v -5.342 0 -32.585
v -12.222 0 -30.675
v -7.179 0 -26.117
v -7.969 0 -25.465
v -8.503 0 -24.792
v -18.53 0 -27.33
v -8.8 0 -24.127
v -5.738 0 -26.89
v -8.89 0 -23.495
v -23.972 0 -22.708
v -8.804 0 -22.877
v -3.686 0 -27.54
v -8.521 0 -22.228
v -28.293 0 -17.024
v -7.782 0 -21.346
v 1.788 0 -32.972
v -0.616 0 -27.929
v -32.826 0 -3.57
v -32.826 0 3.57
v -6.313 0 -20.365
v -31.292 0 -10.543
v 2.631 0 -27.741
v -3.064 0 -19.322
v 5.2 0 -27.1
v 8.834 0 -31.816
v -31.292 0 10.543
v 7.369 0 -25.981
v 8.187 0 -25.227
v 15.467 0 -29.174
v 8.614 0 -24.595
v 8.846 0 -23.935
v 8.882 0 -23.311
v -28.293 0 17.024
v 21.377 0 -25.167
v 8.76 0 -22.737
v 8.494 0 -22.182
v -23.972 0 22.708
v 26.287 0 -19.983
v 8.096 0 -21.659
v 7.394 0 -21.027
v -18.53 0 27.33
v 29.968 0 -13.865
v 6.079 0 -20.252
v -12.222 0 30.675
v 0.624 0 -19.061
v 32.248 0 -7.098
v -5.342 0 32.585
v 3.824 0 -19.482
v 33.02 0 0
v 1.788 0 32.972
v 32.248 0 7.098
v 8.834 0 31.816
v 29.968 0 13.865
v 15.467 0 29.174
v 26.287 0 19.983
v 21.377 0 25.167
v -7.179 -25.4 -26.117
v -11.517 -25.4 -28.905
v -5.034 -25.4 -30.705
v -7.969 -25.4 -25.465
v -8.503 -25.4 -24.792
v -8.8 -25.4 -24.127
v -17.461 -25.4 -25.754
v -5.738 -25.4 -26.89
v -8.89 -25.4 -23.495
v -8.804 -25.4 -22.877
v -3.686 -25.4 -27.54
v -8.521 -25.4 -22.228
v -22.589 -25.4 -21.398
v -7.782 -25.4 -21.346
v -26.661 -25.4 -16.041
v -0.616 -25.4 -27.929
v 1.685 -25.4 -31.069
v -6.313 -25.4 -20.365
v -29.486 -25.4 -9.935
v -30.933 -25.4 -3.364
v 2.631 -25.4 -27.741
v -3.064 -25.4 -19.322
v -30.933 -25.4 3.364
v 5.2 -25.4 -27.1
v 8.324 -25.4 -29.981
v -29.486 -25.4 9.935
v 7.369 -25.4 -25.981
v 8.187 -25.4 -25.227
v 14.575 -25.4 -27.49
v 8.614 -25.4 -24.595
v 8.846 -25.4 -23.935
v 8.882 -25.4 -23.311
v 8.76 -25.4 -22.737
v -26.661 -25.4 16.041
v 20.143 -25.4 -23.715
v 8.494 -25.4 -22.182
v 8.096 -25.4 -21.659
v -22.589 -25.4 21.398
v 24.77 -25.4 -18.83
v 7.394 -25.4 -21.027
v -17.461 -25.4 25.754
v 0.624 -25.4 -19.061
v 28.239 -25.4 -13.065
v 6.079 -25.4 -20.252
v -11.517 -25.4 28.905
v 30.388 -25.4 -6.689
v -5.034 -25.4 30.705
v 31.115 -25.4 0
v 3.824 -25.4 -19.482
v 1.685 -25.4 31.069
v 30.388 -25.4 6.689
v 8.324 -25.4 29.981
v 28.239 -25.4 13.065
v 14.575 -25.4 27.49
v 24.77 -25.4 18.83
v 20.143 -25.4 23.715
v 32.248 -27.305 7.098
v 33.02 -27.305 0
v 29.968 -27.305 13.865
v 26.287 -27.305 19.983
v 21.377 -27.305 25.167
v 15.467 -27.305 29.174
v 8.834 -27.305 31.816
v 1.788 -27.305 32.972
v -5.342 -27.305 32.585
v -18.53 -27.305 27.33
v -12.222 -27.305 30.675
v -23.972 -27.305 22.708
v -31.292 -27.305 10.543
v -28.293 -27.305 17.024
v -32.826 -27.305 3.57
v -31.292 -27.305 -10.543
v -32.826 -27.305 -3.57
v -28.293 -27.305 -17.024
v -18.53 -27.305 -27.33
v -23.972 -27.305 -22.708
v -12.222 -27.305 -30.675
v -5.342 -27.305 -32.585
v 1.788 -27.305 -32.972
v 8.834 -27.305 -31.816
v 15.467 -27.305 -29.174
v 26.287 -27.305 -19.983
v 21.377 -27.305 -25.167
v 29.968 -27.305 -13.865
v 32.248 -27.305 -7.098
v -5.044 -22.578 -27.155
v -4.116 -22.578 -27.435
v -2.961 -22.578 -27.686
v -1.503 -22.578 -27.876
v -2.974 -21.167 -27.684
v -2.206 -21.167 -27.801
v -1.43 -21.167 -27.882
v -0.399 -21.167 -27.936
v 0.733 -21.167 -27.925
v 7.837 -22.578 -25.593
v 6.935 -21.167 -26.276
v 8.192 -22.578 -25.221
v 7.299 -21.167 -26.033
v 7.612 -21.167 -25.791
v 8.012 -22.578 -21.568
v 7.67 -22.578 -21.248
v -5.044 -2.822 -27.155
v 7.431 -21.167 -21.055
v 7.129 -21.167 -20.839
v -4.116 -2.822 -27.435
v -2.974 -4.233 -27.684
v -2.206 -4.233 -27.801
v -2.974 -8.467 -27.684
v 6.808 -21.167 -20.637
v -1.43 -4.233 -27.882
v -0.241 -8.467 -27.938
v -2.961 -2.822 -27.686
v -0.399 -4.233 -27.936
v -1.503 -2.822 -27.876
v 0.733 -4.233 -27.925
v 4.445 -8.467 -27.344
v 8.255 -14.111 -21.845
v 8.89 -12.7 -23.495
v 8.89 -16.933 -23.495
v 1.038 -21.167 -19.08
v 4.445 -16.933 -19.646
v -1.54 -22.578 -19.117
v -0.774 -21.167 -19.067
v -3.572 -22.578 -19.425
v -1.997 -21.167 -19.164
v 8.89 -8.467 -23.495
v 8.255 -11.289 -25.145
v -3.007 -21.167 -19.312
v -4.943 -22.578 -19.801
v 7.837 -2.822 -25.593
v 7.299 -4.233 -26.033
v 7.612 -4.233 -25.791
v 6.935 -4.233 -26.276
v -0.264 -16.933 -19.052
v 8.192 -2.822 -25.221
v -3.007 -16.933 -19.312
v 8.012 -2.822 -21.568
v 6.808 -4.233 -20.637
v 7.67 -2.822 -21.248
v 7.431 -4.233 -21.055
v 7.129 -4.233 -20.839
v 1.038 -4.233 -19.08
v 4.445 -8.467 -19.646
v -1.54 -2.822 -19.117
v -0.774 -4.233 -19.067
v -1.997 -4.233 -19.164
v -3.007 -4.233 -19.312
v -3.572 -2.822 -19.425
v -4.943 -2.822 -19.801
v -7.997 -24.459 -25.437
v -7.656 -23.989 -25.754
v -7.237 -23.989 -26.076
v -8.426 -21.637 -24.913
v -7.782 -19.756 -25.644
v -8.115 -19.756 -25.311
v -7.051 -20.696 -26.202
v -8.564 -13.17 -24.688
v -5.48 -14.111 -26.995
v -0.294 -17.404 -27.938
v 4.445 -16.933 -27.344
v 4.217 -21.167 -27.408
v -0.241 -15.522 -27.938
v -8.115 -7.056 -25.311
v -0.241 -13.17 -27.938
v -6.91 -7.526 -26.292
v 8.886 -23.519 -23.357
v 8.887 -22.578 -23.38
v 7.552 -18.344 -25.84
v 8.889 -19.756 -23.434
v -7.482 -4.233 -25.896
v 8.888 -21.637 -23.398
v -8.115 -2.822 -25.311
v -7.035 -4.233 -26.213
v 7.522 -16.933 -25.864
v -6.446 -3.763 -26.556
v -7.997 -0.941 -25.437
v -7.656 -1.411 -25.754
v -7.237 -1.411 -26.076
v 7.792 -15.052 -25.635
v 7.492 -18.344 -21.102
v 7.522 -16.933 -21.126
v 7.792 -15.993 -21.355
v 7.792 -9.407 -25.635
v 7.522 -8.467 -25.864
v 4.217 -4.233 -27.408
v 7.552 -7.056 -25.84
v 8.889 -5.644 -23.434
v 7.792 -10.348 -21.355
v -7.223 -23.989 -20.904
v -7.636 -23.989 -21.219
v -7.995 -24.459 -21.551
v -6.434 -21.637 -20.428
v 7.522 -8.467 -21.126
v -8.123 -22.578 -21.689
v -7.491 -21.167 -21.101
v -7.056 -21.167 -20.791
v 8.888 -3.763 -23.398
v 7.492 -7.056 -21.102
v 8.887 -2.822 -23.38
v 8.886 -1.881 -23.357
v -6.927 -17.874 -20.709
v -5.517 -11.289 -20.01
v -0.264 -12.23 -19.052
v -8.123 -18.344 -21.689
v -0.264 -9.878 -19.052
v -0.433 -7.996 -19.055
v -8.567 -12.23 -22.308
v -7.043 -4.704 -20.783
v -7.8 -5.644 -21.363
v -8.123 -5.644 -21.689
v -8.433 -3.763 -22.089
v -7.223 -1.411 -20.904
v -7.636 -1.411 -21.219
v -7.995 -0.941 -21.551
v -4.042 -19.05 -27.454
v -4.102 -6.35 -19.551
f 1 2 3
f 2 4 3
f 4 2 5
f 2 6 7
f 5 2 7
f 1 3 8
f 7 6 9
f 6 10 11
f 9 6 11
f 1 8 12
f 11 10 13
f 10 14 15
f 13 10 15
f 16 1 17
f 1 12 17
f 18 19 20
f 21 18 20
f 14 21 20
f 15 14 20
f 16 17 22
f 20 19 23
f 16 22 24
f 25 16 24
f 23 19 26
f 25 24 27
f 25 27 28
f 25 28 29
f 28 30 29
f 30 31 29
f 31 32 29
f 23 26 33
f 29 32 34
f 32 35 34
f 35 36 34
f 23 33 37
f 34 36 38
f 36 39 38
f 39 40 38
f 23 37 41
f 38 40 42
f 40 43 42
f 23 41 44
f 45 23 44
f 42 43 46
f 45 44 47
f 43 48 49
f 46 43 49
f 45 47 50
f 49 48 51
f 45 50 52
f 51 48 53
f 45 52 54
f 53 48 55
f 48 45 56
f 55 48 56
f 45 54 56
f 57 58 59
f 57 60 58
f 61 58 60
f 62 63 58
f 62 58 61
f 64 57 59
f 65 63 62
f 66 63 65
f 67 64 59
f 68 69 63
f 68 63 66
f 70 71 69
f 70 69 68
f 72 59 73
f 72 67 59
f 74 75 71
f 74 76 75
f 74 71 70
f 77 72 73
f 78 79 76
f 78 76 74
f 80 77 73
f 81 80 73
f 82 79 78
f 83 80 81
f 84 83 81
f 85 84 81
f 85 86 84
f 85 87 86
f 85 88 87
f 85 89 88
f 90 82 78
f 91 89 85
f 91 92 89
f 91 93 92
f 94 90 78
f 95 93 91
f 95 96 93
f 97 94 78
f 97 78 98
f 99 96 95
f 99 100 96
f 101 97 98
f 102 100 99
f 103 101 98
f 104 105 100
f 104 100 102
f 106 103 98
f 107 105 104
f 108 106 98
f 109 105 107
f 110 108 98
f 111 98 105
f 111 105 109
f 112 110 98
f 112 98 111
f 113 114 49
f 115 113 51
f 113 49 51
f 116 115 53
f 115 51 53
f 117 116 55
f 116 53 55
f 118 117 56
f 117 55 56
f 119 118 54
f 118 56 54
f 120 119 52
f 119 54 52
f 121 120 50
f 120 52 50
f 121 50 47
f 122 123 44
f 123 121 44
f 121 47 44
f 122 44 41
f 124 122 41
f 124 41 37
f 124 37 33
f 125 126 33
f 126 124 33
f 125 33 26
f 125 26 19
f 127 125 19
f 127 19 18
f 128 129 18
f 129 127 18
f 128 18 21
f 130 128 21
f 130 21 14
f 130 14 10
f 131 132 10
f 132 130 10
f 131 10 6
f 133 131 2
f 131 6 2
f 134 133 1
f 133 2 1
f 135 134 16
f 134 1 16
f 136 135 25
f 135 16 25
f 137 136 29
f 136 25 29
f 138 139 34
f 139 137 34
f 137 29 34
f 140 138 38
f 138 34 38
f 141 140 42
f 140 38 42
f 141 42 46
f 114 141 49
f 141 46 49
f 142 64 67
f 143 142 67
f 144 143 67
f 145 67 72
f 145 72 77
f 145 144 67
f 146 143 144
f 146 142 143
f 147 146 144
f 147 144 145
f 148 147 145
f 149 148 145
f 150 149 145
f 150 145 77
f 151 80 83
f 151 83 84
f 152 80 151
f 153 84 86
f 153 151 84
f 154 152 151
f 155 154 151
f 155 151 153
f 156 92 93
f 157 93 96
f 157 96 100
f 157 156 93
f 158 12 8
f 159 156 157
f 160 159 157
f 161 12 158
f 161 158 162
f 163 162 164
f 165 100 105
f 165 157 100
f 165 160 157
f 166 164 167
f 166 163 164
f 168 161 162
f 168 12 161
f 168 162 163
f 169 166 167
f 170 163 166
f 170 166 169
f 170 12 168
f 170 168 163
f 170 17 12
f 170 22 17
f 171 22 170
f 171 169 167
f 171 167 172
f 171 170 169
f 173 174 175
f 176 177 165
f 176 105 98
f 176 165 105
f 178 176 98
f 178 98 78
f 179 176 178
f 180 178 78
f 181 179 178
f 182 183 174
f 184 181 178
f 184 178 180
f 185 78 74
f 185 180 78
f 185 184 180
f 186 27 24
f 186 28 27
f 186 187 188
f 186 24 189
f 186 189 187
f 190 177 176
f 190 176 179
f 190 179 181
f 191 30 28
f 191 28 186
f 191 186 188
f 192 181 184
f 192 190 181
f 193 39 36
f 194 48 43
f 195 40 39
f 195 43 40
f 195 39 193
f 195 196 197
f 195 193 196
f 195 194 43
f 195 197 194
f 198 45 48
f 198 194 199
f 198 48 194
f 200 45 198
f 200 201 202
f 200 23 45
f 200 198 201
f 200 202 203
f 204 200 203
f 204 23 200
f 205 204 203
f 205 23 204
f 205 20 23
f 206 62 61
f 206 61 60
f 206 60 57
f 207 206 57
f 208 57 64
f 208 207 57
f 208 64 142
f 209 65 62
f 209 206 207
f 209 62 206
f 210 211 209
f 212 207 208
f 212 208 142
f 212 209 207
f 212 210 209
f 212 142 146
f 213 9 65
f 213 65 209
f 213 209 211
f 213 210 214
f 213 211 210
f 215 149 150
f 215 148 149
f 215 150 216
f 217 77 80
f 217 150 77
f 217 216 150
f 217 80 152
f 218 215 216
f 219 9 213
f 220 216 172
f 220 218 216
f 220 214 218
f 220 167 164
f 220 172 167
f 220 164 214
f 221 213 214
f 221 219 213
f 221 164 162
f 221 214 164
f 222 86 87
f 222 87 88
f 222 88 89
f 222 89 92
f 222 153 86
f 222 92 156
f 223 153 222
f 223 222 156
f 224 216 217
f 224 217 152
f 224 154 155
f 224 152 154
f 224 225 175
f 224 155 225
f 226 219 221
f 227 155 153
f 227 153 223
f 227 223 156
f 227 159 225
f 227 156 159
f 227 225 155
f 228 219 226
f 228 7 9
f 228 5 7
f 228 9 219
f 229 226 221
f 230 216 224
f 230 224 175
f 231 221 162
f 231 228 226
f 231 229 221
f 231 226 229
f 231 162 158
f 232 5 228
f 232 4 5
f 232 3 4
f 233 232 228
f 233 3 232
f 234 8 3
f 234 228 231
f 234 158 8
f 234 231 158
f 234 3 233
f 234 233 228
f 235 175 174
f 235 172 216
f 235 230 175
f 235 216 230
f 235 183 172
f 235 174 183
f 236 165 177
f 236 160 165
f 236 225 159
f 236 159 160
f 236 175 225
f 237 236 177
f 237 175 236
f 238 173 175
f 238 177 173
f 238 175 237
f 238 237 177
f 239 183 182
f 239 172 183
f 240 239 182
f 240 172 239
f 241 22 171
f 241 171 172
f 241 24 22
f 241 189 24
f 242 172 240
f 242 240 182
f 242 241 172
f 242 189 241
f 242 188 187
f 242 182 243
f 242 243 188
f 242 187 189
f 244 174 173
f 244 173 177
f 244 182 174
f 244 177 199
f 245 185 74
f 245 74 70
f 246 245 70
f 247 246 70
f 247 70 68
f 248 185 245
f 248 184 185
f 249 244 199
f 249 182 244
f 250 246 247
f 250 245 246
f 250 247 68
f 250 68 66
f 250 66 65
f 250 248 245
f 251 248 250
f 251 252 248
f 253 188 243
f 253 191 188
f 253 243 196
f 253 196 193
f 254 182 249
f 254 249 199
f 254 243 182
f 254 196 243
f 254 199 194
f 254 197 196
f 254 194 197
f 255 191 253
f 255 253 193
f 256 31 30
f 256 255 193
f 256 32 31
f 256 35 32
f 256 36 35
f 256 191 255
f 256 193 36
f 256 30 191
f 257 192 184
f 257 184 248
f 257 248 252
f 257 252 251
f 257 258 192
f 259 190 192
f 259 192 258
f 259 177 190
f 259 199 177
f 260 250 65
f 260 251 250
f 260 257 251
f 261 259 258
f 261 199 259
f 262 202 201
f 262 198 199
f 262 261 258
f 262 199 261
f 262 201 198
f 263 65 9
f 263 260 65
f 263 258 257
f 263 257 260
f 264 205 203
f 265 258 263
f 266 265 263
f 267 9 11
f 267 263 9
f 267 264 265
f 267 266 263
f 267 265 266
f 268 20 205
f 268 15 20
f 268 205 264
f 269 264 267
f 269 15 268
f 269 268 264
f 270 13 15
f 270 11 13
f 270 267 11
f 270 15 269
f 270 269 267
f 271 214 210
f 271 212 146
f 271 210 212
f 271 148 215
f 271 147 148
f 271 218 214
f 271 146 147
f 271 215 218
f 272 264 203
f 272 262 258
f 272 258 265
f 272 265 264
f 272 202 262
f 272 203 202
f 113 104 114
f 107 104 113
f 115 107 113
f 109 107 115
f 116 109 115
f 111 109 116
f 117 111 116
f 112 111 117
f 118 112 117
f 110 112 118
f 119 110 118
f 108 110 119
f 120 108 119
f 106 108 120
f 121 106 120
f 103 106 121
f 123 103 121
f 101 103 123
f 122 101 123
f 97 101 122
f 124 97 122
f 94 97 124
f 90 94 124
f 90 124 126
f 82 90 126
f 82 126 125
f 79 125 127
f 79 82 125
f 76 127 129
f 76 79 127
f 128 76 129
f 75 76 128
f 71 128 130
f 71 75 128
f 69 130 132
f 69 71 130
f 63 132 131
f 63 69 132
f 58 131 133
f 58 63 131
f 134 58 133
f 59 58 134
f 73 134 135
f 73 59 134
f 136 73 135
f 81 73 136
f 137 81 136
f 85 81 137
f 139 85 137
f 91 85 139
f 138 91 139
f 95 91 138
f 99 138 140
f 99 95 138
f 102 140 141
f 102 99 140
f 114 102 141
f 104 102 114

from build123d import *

# Parameters (mm, degrees)
F0_R     = 33.02
F0_R_2   = 28.575
F1_DEPTH = 27.94
F2_DEPTH = 25.4


# Not quite as in the source:
# - a fillet or chamfer that OpenCascade refuses, or shapes differently, is made with other operations: its cross-section is extruded or revolved along the edge and cut away or added


with BuildPart() as f1:
    # F0 (on Front) → F1 (new body)
    with BuildSketch(Plane.XZ):
        Circle(F0_R)
        Circle(F0_R_2, mode=Mode.SUBTRACT)
    extrude(amount=F1_DEPTH)

    # F0 (on Front) → F2 (join)
    with BuildSketch(Plane.XZ):
        Circle(F0_R_2)
        with BuildLine():
            add(Edge.make_bspline(
                [(-8.89, -23.495), (-8.89, -31.1939658396), (4.445, -27.3444829198), (17.78, -23.495), (4.445, -19.6455170802), (-8.89, -15.7960341604), (-8.89, -23.495)],
                knots=[0, 0, 0, 2.0943951024, 2.0943951024, 4.1887902048, 4.1887902048, 6.2831853072, 6.2831853072, 6.2831853072], degree=2, weights=[1, 0.5, 1, 0.5, 1, 0.5, 1]))
        make_face(mode=Mode.SUBTRACT)
    extrude(amount=F2_DEPTH)

    # F3: chamfer of 5.08 on 1 edges, made by hand


with BuildPart() as f3_tool2:
    # F3_s3 → F3_t4 (revolve)
    with BuildSketch(Plane.XY):
        Polygon((33.655, -27.94), (28.575, -22.86), (28.575, -27.94), align=None)
    revolve(axis=Axis((0, -27.94, 0), (0, -1, 0)))

    split(bisect_by=Plane.XZ.offset(25.4), keep=Keep.TOP)


with BuildPart() as f1_1:
    add(f1.part)

    # F3_t1: cut F3_tool2
    add(f3_tool2.part, mode=Mode.SUBTRACT)


solid = f1_1.part
